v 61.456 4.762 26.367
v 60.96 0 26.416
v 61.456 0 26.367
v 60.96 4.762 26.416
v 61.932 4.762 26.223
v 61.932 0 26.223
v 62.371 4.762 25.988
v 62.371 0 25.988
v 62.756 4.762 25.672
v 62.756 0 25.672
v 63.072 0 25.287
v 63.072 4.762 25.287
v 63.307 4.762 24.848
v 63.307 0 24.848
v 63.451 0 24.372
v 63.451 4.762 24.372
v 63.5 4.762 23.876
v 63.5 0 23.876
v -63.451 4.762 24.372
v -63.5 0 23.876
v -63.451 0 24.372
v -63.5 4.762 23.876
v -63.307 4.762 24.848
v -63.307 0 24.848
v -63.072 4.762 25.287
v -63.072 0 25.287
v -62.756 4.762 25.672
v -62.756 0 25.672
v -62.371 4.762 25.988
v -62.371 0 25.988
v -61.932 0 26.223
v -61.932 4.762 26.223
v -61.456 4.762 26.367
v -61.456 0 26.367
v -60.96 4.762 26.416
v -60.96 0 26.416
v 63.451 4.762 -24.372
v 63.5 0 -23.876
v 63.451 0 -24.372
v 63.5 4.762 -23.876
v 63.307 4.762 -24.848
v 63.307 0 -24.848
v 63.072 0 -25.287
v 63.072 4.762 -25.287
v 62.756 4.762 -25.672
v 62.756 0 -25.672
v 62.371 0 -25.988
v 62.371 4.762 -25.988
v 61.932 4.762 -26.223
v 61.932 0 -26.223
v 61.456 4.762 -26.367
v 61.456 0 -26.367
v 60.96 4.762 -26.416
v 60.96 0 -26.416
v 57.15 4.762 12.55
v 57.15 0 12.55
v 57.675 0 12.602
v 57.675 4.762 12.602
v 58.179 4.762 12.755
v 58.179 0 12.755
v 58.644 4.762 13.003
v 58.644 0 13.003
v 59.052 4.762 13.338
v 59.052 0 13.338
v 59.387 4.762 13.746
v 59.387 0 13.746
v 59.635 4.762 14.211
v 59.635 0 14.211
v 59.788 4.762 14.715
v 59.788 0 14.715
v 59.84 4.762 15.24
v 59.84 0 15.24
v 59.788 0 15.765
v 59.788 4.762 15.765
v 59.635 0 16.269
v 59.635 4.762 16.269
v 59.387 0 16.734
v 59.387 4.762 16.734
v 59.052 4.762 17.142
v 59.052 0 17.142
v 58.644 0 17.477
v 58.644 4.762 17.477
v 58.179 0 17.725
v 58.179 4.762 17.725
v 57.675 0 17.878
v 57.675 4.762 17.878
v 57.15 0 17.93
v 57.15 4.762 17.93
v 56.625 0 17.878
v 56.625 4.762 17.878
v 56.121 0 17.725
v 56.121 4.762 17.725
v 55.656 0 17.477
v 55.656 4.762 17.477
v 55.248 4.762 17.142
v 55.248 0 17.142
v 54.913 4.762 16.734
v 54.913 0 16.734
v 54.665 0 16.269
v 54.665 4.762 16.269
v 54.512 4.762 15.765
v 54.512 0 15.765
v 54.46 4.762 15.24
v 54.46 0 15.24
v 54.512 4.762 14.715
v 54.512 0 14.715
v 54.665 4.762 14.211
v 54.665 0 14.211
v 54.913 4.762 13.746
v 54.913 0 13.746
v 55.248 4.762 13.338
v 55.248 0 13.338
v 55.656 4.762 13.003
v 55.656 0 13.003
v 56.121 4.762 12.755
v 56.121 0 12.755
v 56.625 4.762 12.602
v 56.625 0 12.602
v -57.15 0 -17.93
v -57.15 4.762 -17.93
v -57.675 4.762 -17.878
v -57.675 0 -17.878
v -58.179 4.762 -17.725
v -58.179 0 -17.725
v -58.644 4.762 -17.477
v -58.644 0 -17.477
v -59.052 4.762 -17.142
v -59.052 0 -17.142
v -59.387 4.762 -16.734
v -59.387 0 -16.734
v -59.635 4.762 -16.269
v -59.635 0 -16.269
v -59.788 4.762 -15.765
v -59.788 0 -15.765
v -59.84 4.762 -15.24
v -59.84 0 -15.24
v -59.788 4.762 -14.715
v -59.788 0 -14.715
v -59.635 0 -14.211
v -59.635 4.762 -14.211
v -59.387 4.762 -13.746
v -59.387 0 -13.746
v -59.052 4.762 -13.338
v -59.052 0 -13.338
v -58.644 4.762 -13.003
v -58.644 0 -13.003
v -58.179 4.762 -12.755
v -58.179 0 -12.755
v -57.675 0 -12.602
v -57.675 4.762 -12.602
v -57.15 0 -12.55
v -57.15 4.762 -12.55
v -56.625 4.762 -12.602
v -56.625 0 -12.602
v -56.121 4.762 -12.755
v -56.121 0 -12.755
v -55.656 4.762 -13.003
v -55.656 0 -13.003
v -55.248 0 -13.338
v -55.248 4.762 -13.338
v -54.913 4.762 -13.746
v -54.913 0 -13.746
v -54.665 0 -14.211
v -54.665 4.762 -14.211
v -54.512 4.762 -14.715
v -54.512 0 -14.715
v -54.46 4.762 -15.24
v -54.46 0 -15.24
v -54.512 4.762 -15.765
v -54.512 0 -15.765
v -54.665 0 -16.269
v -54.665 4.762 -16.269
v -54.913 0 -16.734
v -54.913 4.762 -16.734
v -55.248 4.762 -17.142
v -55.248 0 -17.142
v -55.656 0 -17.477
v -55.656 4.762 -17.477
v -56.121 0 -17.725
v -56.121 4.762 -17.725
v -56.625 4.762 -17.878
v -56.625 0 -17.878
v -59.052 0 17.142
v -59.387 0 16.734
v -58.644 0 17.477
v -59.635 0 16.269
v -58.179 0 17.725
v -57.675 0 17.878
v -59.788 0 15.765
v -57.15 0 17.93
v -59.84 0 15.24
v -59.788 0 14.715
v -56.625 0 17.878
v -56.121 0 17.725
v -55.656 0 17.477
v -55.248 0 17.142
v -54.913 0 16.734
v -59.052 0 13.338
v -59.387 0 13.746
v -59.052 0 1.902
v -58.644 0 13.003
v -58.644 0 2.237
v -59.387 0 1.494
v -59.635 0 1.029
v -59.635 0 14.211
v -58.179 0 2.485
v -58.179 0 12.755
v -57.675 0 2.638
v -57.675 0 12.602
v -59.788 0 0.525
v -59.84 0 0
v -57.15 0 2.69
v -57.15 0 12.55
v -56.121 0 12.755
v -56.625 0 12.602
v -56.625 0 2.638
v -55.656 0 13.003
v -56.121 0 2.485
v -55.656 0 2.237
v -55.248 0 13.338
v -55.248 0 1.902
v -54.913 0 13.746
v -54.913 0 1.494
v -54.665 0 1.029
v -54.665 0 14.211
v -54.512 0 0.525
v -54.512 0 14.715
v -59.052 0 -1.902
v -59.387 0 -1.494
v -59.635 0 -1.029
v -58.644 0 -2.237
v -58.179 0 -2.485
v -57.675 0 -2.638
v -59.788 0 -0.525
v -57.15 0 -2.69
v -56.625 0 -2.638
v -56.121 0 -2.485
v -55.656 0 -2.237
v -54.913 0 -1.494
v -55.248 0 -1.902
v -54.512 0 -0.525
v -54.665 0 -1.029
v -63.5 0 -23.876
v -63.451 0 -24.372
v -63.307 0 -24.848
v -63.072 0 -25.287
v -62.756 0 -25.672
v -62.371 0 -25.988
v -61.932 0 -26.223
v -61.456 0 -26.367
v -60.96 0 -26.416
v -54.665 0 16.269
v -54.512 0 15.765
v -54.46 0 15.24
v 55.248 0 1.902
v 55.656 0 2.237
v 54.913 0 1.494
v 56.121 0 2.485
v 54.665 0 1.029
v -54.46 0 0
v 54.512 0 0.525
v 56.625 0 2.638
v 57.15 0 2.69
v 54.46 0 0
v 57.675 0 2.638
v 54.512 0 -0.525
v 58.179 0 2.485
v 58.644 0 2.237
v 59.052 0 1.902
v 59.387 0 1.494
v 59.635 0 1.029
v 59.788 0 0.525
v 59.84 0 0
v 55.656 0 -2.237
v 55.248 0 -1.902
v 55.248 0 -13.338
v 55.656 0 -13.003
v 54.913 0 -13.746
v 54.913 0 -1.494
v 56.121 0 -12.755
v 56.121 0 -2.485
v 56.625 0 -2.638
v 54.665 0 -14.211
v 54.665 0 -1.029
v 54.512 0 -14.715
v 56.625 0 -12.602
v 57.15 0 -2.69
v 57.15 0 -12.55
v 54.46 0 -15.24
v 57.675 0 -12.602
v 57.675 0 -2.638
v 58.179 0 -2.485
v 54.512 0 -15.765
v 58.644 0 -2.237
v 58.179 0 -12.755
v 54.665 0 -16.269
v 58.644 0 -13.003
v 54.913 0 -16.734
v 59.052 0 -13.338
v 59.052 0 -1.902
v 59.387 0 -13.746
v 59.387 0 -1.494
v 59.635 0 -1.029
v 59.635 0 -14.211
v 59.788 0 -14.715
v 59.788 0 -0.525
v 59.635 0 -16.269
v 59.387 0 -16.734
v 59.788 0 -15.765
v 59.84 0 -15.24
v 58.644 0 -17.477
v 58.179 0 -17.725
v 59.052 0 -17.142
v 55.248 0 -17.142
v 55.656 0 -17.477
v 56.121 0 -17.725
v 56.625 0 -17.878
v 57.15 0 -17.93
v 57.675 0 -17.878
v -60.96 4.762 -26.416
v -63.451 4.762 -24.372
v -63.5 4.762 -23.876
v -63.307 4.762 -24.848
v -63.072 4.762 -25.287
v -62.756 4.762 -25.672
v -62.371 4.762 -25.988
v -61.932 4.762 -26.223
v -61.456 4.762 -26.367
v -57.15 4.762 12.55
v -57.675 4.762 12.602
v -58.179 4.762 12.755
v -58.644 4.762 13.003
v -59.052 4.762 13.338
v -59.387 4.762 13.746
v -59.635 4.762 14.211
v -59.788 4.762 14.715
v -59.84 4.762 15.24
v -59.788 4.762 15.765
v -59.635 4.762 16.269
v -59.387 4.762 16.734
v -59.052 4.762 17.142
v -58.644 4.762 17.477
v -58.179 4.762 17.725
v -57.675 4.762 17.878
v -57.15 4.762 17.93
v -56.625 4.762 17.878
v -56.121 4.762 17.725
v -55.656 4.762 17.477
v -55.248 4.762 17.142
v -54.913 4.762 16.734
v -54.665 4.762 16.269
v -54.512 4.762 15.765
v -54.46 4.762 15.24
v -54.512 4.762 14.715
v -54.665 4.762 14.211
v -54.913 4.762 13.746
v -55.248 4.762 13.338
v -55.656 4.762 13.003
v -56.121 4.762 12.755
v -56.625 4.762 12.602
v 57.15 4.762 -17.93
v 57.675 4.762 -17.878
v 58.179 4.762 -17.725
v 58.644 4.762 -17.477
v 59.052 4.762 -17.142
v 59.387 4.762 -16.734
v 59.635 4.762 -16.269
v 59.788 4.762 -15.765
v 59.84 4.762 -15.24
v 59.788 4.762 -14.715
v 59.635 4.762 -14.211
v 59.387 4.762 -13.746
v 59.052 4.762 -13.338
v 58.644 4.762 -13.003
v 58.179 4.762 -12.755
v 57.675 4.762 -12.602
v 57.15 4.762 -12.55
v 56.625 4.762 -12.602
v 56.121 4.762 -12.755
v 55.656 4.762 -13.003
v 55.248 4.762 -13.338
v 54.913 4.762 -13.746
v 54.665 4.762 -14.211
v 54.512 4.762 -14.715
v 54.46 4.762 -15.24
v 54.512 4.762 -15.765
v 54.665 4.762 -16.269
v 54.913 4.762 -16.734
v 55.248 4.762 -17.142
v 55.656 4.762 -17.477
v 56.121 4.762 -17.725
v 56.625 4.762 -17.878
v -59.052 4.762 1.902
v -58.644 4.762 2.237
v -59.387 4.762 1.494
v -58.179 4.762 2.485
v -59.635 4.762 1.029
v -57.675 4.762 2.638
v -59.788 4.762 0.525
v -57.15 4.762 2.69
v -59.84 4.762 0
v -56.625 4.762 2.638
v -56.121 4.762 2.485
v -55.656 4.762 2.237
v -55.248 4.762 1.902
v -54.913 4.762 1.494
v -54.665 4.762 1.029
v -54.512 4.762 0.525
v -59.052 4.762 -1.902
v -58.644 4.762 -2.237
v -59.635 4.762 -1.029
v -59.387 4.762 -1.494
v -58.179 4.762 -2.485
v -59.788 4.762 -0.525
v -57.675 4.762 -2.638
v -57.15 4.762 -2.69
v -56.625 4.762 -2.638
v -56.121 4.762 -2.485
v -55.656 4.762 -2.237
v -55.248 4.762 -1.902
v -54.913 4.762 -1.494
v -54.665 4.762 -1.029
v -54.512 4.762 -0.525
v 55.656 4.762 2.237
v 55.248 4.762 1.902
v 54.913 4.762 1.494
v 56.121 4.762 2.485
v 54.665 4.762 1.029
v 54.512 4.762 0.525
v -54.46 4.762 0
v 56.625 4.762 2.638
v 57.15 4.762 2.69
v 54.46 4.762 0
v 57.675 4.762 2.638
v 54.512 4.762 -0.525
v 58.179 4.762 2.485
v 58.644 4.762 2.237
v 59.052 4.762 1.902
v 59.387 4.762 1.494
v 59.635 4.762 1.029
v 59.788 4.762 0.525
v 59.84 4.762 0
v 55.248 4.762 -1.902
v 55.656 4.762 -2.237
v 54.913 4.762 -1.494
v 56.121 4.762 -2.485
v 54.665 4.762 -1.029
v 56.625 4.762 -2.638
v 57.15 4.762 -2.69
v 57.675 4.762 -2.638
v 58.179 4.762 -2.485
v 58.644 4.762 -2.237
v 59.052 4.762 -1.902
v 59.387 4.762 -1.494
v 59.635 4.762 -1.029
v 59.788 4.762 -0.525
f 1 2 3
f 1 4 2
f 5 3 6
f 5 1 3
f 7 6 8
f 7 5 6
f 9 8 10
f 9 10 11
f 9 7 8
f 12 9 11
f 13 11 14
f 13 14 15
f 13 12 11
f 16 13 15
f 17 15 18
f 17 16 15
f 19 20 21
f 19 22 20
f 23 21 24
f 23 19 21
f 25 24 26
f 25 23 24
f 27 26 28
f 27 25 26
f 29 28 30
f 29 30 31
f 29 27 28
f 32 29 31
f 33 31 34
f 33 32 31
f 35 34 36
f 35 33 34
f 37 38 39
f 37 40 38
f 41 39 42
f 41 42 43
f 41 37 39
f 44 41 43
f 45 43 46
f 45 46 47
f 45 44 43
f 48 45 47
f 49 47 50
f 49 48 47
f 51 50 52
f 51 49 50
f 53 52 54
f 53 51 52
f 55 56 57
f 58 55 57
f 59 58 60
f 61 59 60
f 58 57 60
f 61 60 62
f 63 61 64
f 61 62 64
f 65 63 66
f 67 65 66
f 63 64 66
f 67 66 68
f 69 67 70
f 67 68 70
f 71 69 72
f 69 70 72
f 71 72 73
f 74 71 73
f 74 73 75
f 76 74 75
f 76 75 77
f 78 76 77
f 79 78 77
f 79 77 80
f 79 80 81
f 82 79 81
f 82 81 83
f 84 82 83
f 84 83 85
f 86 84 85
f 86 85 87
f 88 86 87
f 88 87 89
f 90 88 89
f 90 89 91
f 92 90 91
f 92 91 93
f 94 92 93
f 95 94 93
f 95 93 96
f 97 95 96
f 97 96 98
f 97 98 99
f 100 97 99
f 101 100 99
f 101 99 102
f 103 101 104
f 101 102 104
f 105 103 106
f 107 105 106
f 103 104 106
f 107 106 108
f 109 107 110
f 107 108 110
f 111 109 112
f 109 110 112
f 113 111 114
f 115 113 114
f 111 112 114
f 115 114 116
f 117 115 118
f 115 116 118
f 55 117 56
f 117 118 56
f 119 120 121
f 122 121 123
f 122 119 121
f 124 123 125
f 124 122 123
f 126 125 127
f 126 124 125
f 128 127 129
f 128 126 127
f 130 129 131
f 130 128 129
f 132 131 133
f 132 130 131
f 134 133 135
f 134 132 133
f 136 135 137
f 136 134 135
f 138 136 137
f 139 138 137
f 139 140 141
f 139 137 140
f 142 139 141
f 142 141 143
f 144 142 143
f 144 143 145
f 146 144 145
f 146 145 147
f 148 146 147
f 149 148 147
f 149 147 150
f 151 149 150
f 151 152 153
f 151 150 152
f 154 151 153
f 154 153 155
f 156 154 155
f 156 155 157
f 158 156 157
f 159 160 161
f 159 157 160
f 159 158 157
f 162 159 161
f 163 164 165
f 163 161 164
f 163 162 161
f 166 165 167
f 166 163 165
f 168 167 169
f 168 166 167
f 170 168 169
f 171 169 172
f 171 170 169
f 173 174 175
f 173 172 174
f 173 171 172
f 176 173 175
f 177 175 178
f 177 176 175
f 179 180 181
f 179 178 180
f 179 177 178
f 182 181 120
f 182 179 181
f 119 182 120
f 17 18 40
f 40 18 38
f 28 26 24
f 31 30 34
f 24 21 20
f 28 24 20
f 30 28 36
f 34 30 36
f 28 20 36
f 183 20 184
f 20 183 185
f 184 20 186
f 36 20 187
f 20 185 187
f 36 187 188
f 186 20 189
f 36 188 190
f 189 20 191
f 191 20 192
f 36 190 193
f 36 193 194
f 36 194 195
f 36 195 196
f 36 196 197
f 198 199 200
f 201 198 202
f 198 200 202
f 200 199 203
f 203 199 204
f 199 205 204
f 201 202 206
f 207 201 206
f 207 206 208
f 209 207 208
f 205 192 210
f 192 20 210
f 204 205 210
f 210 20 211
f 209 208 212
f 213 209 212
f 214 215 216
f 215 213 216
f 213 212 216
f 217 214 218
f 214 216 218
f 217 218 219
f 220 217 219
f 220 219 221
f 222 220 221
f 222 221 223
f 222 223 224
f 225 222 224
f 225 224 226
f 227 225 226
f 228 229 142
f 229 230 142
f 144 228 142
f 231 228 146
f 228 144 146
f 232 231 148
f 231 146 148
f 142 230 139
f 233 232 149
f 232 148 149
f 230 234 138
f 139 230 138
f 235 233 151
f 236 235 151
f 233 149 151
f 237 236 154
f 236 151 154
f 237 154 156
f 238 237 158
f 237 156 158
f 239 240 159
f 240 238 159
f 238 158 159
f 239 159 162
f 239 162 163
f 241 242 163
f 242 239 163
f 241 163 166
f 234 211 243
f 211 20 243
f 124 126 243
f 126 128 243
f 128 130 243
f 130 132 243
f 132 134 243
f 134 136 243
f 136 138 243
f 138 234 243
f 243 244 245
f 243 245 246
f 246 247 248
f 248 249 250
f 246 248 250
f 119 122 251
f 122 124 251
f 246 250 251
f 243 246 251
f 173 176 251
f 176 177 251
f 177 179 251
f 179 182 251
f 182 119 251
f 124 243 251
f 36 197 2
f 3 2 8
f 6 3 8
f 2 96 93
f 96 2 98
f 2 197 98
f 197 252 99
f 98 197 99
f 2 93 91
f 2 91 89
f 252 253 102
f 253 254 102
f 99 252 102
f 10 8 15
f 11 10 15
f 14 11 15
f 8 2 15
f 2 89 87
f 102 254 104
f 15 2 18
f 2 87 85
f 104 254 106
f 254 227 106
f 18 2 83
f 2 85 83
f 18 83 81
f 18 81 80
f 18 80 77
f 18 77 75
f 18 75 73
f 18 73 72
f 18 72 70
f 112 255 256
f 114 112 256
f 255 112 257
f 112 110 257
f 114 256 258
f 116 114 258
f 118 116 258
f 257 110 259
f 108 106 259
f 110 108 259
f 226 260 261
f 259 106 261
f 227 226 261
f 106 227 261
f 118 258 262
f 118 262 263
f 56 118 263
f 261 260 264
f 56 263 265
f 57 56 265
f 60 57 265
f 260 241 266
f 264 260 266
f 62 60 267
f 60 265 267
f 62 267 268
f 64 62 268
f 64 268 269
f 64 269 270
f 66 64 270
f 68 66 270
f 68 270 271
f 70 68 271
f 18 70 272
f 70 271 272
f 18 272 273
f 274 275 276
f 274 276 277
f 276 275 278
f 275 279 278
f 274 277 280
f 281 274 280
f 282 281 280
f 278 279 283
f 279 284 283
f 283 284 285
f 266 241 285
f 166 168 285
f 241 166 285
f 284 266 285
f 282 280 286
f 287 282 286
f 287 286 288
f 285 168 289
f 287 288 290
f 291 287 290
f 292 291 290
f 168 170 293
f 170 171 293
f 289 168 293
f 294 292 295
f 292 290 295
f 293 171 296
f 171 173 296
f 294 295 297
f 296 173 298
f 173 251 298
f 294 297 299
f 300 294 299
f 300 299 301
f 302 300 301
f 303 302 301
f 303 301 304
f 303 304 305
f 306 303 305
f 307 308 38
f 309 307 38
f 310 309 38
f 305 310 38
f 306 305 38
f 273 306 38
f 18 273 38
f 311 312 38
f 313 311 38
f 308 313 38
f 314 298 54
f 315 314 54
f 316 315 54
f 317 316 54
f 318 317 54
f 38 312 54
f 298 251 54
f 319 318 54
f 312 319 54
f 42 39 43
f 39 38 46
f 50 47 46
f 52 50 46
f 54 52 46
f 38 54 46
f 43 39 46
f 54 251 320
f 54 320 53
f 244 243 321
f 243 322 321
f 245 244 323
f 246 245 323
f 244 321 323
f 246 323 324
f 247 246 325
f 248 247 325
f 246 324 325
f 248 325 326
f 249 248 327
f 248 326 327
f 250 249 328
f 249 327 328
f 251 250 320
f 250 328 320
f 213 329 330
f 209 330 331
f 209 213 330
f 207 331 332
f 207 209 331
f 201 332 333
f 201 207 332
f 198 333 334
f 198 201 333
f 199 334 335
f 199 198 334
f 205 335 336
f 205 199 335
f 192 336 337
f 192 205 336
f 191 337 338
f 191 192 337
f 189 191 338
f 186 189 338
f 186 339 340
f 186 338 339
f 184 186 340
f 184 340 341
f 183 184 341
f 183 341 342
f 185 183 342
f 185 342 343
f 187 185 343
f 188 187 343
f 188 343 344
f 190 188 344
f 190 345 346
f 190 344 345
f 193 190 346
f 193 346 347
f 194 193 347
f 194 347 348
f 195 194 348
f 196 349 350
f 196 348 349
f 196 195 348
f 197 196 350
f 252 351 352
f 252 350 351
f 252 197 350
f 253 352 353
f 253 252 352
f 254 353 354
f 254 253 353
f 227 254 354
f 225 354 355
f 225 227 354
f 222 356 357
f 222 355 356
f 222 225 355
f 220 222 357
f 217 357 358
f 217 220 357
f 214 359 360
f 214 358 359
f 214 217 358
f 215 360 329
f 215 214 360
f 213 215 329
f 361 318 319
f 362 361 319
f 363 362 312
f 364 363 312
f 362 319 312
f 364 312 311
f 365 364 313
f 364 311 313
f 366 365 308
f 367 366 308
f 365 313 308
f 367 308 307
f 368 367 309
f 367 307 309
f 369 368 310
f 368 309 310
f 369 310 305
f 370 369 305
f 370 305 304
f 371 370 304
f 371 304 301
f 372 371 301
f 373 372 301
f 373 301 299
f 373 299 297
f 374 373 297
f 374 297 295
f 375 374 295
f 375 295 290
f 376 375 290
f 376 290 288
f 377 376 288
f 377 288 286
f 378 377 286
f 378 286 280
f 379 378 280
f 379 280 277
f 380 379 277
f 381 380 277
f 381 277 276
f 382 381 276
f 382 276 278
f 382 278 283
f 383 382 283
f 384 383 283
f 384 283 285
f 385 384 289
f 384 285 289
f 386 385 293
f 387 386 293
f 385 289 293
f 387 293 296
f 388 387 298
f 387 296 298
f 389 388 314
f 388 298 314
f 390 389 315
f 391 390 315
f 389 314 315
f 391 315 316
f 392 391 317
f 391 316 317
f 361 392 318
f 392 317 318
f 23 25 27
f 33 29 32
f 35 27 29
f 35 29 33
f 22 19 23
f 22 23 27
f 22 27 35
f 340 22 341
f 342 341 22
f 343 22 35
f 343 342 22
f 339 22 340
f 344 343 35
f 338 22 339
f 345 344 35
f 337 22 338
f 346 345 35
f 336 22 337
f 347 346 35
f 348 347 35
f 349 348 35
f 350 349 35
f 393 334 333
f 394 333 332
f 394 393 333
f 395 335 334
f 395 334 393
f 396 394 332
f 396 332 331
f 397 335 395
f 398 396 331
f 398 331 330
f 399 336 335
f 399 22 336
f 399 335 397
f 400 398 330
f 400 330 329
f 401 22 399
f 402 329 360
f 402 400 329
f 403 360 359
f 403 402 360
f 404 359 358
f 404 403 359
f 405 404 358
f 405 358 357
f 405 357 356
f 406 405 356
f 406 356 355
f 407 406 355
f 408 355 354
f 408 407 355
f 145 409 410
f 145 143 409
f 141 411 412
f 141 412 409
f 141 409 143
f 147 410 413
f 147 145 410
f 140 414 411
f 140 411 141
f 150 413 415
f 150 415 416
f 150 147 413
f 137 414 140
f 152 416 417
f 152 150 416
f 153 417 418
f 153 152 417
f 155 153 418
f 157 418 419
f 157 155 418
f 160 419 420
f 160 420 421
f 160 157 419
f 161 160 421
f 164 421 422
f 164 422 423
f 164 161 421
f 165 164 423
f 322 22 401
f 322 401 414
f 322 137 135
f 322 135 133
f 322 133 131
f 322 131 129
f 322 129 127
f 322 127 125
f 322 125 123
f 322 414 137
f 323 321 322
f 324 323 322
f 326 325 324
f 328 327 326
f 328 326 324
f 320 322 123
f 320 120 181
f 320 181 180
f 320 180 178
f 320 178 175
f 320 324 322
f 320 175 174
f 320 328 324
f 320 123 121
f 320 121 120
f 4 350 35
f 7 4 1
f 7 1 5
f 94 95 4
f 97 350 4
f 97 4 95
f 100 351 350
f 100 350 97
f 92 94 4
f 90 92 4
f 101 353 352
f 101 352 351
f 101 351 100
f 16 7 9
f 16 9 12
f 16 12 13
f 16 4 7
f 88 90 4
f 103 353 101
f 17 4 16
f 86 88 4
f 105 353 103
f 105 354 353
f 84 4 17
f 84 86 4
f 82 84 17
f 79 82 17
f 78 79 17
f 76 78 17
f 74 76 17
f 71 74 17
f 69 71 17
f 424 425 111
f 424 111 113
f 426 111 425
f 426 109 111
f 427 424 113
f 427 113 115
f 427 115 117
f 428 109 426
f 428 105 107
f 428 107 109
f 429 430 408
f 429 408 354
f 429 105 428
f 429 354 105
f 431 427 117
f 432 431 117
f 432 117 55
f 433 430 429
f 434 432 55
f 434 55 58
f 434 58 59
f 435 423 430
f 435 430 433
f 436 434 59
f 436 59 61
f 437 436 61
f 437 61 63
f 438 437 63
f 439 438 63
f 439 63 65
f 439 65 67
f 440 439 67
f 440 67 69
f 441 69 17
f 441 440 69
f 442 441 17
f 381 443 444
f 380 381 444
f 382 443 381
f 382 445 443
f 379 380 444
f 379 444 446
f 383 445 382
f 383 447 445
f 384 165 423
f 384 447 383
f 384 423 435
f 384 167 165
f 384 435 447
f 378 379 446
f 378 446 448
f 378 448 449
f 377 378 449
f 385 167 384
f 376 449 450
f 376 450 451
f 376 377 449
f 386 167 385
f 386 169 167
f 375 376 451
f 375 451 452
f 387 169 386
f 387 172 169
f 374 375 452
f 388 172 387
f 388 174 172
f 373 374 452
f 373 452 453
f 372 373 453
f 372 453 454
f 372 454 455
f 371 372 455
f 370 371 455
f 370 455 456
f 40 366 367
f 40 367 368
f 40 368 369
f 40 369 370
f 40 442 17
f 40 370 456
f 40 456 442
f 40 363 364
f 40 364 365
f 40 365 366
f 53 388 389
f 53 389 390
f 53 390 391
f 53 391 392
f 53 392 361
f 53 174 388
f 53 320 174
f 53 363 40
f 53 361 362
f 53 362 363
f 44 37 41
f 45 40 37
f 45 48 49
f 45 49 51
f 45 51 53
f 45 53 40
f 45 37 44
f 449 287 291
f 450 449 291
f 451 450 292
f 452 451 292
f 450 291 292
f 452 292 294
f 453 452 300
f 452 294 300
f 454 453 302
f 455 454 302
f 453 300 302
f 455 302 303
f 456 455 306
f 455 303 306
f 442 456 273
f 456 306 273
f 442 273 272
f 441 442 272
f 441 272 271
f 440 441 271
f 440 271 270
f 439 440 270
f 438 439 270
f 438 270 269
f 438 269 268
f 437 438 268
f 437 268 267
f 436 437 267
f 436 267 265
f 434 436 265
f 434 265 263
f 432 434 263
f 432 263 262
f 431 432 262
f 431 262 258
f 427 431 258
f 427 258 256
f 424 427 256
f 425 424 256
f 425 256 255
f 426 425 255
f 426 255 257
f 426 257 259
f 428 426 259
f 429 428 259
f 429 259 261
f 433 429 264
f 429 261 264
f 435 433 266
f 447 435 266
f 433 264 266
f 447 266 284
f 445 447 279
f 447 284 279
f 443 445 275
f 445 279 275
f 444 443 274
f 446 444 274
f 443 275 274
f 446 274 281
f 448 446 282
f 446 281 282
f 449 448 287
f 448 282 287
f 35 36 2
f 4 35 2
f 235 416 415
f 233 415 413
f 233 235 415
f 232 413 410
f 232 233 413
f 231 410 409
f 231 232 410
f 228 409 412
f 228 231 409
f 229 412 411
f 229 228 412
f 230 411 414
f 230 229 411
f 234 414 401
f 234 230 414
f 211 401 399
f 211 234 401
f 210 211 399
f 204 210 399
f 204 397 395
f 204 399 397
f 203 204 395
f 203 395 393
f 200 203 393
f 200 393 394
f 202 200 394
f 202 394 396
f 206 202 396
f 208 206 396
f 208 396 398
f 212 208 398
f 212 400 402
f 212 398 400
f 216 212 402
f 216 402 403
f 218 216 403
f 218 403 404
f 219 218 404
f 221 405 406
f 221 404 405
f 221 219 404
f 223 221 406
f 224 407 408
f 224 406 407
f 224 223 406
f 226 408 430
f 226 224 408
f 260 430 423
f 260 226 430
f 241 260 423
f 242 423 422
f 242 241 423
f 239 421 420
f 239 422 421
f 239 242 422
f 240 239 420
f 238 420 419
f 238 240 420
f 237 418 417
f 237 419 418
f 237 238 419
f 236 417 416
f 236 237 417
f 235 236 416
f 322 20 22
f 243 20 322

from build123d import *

# Parameters (mm, degrees)
SKETCH1_W           = 127
SKETCH1_H           = 52.832
BOSS_EXTRUDE1_DEPTH = 4.7625
FILLET1_R           = 2.54
SKETCH2_R           = 2.69
CUT_EXTRUDE1_DEPTH  = 69.940093286


with BuildPart() as part:
    # Sketch1 → Boss-Extrude1 (new body)
    with BuildSketch(Plane(origin=(0, 0, 0), x_dir=(1, 0, 0), z_dir=(0, 1, 0))):
        Rectangle(SKETCH1_W, SKETCH1_H)
    extrude(amount=BOSS_EXTRUDE1_DEPTH)

    # Fillet1
    fillet1_edges = [part.edges().sort_by_distance(p)[0] for p in [
        (63.5, 2.38125, 26.416),
        (-63.5, 2.38125, 26.416),
        (-63.5, 2.38125, -26.416),
        (63.5, 2.38125, -26.416),
    ]]
    fillet(fillet1_edges, radius=FILLET1_R)

    # Sketch2 → Cut-Extrude1 (cut, through all)
    with BuildSketch(Plane.XZ):
        with Locations(Location((57.15, -15.24, 0), (0, 0, 270))):
            Circle(SKETCH2_R)
        with Locations(Location((57.15, 0, 0), (0, 0, 270))):
            Circle(SKETCH2_R)
        with Locations(Location((57.15, 15.24, 0), (0, 0, 270))):
            Circle(SKETCH2_R)
    cut_extrude1 = extrude(amount=-CUT_EXTRUDE1_DEPTH, mode=Mode.SUBTRACT)

    # Mirror1: Cut-Extrude1 across plane
    add(cut_extrude1.mirror(Plane(origin=(0, 0, 0), x_dir=(0, 0, 1), z_dir=(1, 0, 0))), mode=Mode.SUBTRACT)


solid = part.part
